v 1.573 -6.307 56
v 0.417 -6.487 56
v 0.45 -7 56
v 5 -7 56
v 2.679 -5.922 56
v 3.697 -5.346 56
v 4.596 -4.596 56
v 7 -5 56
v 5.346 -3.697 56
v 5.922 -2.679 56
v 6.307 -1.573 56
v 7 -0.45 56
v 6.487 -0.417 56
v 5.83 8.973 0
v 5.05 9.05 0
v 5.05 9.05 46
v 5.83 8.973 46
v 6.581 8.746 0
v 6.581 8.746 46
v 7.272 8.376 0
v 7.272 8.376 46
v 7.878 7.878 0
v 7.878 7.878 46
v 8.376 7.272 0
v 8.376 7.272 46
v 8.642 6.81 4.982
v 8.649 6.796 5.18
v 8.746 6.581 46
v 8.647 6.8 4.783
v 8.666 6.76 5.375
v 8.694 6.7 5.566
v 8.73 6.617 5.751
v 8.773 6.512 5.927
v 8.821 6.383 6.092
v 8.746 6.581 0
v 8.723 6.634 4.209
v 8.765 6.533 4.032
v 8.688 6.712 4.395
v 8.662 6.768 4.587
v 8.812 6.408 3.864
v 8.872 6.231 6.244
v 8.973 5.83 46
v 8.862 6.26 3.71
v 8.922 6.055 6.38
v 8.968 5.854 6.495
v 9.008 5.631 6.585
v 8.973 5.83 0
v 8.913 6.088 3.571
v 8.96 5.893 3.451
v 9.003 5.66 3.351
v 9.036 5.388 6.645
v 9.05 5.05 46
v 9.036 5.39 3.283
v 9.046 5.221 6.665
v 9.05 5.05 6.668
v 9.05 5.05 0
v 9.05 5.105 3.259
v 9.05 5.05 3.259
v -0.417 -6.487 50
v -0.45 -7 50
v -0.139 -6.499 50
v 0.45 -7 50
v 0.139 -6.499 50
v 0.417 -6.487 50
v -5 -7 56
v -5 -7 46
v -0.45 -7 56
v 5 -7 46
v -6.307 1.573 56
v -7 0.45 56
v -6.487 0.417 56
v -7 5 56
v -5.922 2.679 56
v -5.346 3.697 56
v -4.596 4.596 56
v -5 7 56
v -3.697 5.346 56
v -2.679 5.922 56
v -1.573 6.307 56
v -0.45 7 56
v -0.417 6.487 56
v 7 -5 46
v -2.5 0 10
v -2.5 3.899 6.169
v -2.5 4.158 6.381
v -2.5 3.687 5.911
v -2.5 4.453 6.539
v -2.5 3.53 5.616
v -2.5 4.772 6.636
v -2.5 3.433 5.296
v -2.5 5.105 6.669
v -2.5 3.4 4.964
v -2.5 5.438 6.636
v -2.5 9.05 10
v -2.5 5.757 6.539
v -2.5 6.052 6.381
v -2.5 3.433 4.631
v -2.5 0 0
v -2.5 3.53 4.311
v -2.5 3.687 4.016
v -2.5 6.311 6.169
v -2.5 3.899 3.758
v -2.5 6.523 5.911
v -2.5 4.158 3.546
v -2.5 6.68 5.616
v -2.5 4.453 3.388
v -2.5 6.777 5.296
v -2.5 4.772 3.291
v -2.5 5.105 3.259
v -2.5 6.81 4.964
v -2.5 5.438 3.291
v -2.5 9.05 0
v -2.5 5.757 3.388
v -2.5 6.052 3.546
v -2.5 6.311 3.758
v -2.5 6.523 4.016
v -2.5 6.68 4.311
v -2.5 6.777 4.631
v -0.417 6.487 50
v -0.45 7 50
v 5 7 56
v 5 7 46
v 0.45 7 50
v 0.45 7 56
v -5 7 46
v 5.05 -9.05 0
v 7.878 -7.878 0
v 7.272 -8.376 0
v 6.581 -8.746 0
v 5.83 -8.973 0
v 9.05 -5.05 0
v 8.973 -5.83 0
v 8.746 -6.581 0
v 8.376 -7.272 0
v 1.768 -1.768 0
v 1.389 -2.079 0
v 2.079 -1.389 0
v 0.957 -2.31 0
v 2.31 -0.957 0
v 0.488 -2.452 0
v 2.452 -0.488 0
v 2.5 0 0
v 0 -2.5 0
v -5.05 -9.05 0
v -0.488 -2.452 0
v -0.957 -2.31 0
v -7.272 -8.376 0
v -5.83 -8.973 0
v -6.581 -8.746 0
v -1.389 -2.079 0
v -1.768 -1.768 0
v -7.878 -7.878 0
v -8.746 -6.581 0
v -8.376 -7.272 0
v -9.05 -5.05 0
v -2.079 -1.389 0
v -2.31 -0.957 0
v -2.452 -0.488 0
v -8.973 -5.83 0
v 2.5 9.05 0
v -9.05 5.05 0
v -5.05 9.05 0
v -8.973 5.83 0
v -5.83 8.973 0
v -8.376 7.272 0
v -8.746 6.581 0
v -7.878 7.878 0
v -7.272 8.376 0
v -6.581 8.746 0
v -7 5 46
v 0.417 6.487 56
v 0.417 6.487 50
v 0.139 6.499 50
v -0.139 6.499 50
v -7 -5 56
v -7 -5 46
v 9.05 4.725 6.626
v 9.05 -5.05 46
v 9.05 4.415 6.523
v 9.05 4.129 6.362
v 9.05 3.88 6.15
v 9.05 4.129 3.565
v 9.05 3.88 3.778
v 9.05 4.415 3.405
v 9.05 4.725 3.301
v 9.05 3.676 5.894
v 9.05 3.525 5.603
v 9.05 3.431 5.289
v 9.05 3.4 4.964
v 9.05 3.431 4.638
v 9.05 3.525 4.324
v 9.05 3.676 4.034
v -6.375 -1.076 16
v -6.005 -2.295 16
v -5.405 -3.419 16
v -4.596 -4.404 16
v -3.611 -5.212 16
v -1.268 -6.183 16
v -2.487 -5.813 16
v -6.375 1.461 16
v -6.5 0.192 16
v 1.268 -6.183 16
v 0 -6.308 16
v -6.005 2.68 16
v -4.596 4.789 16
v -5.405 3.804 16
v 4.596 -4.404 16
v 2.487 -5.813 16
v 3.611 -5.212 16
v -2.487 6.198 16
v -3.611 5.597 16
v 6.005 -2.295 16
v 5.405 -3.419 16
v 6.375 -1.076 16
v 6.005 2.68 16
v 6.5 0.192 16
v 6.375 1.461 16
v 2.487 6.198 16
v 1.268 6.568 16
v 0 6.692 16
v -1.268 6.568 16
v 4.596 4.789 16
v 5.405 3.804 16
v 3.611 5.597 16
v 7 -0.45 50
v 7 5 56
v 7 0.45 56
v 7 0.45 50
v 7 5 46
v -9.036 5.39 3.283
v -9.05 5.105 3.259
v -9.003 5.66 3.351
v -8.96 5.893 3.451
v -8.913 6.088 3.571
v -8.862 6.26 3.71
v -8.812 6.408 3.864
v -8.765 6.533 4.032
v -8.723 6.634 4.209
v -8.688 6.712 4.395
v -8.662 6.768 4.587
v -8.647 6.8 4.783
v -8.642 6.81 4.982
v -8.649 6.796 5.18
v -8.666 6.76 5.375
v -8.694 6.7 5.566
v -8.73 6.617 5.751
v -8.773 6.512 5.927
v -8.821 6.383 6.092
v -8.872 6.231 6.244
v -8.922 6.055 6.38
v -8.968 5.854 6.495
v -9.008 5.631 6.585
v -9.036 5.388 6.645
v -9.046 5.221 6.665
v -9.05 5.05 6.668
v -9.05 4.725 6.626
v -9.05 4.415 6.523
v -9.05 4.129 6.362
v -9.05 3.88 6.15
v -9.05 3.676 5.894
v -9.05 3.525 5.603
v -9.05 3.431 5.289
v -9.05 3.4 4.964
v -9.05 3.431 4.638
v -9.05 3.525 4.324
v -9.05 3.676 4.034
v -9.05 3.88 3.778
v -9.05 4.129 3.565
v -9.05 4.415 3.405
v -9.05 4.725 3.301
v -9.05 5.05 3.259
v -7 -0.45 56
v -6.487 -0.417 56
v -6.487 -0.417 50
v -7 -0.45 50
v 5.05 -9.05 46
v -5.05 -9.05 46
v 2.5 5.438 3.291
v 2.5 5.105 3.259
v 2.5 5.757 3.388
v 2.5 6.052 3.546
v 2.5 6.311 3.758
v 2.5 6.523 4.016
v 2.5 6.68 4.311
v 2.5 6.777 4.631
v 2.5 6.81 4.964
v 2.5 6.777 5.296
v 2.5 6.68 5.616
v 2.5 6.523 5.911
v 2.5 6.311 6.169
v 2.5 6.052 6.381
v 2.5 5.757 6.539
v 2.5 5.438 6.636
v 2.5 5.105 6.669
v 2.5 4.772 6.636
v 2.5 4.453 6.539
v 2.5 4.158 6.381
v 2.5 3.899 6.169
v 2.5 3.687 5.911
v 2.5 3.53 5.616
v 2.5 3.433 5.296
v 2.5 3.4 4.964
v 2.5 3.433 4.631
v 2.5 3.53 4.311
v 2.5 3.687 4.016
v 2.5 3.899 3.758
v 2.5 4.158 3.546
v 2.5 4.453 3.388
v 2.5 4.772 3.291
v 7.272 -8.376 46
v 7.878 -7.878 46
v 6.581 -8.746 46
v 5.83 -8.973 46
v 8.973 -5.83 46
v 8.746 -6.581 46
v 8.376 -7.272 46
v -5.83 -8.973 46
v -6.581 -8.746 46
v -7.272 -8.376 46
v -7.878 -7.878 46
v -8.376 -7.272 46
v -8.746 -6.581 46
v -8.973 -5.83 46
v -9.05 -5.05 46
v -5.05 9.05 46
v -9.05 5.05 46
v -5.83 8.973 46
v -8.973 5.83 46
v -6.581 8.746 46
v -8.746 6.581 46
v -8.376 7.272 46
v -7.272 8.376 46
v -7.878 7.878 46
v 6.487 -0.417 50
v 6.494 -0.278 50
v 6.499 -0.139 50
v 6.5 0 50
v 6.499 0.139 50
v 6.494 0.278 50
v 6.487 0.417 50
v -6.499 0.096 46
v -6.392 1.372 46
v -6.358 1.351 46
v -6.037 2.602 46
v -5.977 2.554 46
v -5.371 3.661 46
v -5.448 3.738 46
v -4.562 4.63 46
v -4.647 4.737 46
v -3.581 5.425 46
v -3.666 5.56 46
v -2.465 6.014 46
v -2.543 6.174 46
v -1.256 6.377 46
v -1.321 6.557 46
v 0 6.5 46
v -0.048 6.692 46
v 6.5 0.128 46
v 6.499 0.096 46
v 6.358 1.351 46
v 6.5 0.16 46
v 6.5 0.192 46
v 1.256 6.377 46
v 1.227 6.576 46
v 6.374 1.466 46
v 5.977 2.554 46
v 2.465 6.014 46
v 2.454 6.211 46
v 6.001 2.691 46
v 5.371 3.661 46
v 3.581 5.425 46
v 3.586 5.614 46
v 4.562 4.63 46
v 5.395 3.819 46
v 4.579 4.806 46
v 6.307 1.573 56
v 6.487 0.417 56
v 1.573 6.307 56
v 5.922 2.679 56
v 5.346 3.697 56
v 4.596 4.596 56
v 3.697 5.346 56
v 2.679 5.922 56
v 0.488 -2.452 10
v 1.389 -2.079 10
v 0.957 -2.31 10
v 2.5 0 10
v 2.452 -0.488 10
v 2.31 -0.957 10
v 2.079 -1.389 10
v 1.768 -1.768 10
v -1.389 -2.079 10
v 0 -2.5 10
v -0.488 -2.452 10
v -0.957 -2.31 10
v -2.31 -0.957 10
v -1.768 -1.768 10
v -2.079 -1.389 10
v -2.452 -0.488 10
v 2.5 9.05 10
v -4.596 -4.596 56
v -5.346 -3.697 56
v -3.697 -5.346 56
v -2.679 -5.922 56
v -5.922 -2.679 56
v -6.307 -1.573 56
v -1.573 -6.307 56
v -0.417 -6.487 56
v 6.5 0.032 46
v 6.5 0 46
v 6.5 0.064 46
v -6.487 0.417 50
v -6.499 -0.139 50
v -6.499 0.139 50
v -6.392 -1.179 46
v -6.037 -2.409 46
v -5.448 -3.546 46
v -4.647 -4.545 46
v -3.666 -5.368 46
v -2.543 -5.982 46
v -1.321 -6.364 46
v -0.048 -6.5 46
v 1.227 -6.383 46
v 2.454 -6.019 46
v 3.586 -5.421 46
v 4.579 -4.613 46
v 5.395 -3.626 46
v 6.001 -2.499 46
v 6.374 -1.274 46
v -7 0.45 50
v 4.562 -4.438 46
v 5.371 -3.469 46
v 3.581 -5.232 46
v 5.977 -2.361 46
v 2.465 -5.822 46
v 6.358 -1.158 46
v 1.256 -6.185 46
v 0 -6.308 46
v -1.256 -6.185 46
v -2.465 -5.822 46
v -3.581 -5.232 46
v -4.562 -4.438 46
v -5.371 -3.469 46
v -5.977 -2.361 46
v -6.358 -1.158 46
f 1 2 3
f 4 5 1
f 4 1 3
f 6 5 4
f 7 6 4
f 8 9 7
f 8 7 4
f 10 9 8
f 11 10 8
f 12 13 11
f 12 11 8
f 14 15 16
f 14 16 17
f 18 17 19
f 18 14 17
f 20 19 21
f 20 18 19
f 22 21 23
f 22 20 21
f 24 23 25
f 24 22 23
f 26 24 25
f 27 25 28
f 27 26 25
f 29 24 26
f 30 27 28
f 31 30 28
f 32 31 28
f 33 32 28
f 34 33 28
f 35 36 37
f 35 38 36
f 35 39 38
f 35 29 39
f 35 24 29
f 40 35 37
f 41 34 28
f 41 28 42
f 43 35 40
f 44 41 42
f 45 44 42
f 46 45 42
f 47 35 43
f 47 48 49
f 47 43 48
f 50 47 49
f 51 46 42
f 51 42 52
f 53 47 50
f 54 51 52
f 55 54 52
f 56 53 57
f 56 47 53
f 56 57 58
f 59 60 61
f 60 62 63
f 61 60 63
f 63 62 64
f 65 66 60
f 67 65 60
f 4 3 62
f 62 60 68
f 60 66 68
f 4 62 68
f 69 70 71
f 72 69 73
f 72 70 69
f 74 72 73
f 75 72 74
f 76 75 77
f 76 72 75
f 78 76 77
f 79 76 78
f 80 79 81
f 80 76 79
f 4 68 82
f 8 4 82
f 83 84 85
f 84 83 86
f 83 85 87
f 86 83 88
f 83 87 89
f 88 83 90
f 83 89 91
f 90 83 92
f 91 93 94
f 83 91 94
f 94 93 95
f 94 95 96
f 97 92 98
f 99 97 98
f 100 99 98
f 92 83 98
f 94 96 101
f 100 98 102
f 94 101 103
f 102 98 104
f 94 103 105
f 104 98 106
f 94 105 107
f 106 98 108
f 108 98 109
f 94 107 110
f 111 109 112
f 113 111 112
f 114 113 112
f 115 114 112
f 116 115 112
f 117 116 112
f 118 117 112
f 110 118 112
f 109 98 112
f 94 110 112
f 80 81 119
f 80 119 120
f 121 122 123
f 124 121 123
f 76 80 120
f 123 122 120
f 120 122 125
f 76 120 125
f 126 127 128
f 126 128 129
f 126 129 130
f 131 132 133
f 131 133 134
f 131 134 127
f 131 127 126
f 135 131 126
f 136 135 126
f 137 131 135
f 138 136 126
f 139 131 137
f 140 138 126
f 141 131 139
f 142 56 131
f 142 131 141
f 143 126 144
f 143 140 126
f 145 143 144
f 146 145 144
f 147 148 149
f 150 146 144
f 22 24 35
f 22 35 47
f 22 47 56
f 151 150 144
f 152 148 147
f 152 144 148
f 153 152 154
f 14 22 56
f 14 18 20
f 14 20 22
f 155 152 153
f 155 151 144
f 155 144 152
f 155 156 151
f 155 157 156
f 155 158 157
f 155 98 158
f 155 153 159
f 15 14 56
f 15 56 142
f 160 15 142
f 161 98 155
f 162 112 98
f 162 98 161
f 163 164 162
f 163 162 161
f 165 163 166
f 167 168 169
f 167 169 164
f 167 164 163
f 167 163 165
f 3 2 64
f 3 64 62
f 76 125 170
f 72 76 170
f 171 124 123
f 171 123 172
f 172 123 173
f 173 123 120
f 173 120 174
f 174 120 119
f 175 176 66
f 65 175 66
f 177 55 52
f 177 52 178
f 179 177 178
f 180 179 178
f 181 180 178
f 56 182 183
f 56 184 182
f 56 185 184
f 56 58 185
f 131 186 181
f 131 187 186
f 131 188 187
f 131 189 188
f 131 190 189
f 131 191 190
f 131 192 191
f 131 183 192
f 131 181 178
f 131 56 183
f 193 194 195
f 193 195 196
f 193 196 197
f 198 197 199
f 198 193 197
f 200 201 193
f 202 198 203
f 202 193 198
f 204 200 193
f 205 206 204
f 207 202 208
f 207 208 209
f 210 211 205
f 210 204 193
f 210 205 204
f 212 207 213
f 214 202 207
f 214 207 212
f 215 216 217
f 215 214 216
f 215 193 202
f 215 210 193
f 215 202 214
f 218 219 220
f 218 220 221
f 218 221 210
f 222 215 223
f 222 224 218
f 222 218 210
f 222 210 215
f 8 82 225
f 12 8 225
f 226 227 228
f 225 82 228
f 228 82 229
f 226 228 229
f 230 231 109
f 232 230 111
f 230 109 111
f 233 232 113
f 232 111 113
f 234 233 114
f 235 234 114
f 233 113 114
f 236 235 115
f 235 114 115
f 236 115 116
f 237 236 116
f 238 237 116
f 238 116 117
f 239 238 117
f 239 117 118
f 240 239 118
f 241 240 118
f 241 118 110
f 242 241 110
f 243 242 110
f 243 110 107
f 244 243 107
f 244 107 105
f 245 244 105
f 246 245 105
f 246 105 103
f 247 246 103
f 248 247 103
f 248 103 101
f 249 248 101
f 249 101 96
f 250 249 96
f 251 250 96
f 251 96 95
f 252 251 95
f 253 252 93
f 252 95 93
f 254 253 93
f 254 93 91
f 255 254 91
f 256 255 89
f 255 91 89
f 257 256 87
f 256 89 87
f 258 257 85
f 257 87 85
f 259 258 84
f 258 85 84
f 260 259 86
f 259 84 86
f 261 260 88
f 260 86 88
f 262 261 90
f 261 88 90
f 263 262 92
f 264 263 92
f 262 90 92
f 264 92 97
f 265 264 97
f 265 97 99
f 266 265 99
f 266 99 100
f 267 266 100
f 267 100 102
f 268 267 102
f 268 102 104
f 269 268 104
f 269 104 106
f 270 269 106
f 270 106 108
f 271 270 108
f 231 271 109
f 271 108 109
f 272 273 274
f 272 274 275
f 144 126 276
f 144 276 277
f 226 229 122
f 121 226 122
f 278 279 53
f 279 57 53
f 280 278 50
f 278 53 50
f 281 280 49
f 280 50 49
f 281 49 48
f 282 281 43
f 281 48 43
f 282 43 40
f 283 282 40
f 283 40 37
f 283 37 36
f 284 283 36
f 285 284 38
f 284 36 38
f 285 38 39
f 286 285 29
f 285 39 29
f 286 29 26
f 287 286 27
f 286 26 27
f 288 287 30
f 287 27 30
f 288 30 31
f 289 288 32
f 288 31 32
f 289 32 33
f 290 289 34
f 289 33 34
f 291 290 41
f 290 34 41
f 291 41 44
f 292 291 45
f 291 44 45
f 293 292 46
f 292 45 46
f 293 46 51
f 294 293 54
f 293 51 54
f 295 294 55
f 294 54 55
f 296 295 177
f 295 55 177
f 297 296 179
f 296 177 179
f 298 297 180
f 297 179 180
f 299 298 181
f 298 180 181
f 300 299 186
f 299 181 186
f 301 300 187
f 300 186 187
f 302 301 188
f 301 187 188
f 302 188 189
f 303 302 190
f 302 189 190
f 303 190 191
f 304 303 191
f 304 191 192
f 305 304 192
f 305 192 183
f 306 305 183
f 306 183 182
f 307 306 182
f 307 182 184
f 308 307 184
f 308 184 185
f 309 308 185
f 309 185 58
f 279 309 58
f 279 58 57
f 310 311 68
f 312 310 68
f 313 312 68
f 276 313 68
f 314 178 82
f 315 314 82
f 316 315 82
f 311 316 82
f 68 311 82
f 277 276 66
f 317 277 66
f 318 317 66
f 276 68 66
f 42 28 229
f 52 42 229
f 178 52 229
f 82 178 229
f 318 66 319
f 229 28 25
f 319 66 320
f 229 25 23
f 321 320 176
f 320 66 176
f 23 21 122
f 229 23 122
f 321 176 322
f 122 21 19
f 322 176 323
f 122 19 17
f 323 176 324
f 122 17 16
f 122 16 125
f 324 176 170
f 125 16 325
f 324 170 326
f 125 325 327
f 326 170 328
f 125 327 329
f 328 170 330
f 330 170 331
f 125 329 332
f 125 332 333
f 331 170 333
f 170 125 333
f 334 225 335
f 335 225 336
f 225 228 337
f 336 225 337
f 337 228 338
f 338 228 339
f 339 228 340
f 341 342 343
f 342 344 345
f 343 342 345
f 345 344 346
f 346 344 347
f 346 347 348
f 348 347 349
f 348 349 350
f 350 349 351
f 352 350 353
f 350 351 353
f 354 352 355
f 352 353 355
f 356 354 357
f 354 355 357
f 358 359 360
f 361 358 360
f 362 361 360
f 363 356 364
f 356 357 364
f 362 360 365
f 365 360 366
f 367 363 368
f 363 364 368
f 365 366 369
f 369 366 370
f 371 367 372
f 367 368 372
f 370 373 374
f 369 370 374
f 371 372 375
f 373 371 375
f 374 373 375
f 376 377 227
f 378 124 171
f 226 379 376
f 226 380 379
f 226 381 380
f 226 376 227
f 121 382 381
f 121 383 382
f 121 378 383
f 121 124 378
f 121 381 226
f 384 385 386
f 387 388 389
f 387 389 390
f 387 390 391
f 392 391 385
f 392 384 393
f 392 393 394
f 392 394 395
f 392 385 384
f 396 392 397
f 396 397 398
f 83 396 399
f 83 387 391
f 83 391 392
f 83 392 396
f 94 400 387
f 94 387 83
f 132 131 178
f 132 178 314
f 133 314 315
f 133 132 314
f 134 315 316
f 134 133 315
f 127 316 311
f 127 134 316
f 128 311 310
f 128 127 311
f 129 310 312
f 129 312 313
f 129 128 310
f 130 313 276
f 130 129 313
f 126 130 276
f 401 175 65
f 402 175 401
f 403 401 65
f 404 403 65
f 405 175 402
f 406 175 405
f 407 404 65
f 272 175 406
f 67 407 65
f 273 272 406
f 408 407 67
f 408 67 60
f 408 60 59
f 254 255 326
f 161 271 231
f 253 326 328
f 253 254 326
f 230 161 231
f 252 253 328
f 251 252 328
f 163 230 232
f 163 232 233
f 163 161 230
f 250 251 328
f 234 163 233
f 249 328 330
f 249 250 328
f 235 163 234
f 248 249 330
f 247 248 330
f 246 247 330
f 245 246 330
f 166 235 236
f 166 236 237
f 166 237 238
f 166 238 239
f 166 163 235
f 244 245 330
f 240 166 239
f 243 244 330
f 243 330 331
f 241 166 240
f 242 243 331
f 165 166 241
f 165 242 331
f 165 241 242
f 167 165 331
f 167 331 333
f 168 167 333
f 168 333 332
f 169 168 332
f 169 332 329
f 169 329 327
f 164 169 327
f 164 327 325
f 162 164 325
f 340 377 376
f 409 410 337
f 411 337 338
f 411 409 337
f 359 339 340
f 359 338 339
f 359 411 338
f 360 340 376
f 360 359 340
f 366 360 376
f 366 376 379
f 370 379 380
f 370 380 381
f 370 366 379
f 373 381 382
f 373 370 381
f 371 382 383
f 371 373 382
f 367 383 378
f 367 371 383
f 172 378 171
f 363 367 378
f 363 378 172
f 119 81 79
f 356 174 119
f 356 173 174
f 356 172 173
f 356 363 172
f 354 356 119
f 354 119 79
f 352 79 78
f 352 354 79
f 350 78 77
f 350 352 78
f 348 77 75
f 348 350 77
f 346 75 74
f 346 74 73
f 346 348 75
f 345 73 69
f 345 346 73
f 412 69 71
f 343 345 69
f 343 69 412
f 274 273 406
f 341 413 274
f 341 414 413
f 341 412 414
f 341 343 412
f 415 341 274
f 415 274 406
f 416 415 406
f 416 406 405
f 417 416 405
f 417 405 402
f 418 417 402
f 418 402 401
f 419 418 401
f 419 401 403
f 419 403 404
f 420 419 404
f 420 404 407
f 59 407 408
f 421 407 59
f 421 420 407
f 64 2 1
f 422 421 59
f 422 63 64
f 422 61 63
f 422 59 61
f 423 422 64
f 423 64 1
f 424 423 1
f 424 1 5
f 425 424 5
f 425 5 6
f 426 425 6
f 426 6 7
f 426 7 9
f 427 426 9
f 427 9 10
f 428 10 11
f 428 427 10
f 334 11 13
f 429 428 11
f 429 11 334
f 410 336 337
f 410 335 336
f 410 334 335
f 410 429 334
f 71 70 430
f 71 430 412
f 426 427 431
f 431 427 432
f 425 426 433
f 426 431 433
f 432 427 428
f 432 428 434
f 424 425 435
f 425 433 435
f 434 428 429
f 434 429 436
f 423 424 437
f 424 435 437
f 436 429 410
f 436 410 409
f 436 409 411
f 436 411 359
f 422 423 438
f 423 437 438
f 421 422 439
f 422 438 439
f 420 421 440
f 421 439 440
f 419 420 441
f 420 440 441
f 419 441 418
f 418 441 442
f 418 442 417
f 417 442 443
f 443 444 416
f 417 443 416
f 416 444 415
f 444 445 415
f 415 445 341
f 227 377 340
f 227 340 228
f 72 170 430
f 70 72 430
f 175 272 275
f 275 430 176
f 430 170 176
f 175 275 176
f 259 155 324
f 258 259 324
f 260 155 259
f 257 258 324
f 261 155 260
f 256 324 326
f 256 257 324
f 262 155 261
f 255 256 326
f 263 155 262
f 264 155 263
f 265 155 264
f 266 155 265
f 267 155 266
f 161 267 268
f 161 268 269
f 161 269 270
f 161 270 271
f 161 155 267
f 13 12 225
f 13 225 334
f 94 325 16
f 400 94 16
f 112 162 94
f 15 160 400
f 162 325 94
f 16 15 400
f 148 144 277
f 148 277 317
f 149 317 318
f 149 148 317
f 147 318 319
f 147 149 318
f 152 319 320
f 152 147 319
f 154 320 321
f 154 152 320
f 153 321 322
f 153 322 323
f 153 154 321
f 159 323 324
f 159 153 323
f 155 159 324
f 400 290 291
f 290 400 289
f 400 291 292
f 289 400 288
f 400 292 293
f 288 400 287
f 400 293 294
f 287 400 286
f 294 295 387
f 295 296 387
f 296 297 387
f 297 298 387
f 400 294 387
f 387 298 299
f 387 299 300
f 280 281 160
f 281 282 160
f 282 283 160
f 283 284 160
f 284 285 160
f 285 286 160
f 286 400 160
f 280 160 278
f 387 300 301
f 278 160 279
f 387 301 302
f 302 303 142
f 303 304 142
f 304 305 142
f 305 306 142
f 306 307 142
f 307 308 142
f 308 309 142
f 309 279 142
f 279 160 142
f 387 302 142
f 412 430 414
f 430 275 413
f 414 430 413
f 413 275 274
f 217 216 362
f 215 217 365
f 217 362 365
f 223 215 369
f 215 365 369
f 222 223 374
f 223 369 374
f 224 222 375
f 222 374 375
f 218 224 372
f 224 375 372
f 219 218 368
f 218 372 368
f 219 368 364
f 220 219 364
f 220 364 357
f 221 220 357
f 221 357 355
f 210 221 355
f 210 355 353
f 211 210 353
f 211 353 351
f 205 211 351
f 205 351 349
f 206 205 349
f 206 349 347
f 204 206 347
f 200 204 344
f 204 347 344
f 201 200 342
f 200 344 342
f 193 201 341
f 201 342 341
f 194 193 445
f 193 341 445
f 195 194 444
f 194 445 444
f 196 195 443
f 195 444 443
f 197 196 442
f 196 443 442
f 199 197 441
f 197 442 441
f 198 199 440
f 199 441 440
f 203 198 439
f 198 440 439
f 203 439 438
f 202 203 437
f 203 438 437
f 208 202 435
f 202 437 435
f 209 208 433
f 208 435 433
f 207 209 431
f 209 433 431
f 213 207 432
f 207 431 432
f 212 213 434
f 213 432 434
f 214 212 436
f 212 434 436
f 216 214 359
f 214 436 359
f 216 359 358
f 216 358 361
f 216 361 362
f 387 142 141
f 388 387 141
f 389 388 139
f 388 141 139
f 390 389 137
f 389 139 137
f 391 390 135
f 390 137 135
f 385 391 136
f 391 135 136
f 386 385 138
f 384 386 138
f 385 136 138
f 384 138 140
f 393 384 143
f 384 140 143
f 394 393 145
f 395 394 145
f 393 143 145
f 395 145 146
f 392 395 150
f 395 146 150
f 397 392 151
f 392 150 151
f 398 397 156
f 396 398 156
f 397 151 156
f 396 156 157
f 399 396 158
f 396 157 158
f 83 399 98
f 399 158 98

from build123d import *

# Parameters (mm, degrees)
BOSS_EXTRUDE1_DEPTH = 46
SKETCH3_R           = 6.5
BOSS_EXTRUDE2_DEPTH = 10
CUT_EXTRUDE7_DEPTH  = 6
CIRPATTERN1_COUNT   = 4
SKETCH12_R          = 6.5
CUT_EXTRUDE8_DEPTH  = 30
CUT_EXTRUDE9_DEPTH  = 10
SKETCH14_R          = 1.705
CUT_EXTRUDE10_DEPTH = 12.5


with BuildPart() as part:
    # Sketch1 → Boss-Extrude1 (new body)
    with BuildSketch(Plane.XY):
        with BuildLine():
            Line((-5.05, 9.05), (5.05, 9.05))
            ThreePointArc((5.05, 9.05), (7.878427125, 7.878427125), (9.05, 5.05))
            Line((9.05, 5.05), (9.05, -5.05))
            ThreePointArc((9.05, -5.05), (7.878427125, -7.878427125), (5.05, -9.05))
            Line((5.05, -9.05), (-5.05, -9.05))
            ThreePointArc((-5.05, -9.05), (-7.878427125, -7.878427125), (-9.05, -5.05))
            Line((-9.05, -5.05), (-9.05, 5.05))
            ThreePointArc((-9.05, 5.05), (-7.878427125, 7.878427125), (-5.05, 9.05))
        make_face()
    extrude(amount=BOSS_EXTRUDE1_DEPTH)

    # Sketch3 → Boss-Extrude2 (add)
    with BuildSketch(Plane.XY.offset(46)):
        Polygon((-5, -7), (5, -7), (7, -5), (7, 5), (5, 7), (-5, 7), (-7, 5), (-7, -5), align=None)
        Circle(SKETCH3_R, mode=Mode.SUBTRACT)
    extrude(amount=BOSS_EXTRUDE2_DEPTH)

    # Sketch11 → Cut-Extrude7 (cut)
    with BuildSketch(Plane.XY.offset(56)):
        Polygon((0, 0), (7, 0.45), (7, -0.45), align=None)
    cut_extrude7 = extrude(amount=-CUT_EXTRUDE7_DEPTH, mode=Mode.SUBTRACT)

    # CirPattern1: Cut-Extrude7 ×4 about axis
    cirpattern1_axis = Axis((0, 0, 56), (0, 0, -1))
    for i in range(1, CIRPATTERN1_COUNT):
        add(cut_extrude7.rotate(cirpattern1_axis, i * 360 / CIRPATTERN1_COUNT), mode=Mode.SUBTRACT)

    # Sketch12 → Cut-Extrude8 (cut)
    with BuildSketch(Plane.XY.offset(46)):
        with Locations((0, 0.192488852)):
            Circle(SKETCH12_R)
    extrude(amount=-CUT_EXTRUDE8_DEPTH, mode=Mode.SUBTRACT)

    # Sketch13 → Cut-Extrude9 (cut)
    with BuildSketch(Plane.XY):
        with BuildLine():
            Line((-2.5, 0), (-2.5, 9.05))
            Line((-2.5, 9.05), (2.5, 9.05))
            Line((2.5, 9.05), (2.5, 0))
            ThreePointArc((2.5, 0), (0, -2.5), (-2.5, 0))
        make_face()
    extrude(amount=CUT_EXTRUDE9_DEPTH, mode=Mode.SUBTRACT)

    # Sketch14 → Cut-Extrude10 (cut, symmetric)
    with BuildSketch(Plane(origin=(0, 0, 0), x_dir=(0, 0, -1), z_dir=(1, 0, 0))):
        with Locations((-4.963568093, 5.105)):
            Circle(SKETCH14_R)
    extrude(amount=CUT_EXTRUDE10_DEPTH, both=True, mode=Mode.SUBTRACT)


solid = part.part
